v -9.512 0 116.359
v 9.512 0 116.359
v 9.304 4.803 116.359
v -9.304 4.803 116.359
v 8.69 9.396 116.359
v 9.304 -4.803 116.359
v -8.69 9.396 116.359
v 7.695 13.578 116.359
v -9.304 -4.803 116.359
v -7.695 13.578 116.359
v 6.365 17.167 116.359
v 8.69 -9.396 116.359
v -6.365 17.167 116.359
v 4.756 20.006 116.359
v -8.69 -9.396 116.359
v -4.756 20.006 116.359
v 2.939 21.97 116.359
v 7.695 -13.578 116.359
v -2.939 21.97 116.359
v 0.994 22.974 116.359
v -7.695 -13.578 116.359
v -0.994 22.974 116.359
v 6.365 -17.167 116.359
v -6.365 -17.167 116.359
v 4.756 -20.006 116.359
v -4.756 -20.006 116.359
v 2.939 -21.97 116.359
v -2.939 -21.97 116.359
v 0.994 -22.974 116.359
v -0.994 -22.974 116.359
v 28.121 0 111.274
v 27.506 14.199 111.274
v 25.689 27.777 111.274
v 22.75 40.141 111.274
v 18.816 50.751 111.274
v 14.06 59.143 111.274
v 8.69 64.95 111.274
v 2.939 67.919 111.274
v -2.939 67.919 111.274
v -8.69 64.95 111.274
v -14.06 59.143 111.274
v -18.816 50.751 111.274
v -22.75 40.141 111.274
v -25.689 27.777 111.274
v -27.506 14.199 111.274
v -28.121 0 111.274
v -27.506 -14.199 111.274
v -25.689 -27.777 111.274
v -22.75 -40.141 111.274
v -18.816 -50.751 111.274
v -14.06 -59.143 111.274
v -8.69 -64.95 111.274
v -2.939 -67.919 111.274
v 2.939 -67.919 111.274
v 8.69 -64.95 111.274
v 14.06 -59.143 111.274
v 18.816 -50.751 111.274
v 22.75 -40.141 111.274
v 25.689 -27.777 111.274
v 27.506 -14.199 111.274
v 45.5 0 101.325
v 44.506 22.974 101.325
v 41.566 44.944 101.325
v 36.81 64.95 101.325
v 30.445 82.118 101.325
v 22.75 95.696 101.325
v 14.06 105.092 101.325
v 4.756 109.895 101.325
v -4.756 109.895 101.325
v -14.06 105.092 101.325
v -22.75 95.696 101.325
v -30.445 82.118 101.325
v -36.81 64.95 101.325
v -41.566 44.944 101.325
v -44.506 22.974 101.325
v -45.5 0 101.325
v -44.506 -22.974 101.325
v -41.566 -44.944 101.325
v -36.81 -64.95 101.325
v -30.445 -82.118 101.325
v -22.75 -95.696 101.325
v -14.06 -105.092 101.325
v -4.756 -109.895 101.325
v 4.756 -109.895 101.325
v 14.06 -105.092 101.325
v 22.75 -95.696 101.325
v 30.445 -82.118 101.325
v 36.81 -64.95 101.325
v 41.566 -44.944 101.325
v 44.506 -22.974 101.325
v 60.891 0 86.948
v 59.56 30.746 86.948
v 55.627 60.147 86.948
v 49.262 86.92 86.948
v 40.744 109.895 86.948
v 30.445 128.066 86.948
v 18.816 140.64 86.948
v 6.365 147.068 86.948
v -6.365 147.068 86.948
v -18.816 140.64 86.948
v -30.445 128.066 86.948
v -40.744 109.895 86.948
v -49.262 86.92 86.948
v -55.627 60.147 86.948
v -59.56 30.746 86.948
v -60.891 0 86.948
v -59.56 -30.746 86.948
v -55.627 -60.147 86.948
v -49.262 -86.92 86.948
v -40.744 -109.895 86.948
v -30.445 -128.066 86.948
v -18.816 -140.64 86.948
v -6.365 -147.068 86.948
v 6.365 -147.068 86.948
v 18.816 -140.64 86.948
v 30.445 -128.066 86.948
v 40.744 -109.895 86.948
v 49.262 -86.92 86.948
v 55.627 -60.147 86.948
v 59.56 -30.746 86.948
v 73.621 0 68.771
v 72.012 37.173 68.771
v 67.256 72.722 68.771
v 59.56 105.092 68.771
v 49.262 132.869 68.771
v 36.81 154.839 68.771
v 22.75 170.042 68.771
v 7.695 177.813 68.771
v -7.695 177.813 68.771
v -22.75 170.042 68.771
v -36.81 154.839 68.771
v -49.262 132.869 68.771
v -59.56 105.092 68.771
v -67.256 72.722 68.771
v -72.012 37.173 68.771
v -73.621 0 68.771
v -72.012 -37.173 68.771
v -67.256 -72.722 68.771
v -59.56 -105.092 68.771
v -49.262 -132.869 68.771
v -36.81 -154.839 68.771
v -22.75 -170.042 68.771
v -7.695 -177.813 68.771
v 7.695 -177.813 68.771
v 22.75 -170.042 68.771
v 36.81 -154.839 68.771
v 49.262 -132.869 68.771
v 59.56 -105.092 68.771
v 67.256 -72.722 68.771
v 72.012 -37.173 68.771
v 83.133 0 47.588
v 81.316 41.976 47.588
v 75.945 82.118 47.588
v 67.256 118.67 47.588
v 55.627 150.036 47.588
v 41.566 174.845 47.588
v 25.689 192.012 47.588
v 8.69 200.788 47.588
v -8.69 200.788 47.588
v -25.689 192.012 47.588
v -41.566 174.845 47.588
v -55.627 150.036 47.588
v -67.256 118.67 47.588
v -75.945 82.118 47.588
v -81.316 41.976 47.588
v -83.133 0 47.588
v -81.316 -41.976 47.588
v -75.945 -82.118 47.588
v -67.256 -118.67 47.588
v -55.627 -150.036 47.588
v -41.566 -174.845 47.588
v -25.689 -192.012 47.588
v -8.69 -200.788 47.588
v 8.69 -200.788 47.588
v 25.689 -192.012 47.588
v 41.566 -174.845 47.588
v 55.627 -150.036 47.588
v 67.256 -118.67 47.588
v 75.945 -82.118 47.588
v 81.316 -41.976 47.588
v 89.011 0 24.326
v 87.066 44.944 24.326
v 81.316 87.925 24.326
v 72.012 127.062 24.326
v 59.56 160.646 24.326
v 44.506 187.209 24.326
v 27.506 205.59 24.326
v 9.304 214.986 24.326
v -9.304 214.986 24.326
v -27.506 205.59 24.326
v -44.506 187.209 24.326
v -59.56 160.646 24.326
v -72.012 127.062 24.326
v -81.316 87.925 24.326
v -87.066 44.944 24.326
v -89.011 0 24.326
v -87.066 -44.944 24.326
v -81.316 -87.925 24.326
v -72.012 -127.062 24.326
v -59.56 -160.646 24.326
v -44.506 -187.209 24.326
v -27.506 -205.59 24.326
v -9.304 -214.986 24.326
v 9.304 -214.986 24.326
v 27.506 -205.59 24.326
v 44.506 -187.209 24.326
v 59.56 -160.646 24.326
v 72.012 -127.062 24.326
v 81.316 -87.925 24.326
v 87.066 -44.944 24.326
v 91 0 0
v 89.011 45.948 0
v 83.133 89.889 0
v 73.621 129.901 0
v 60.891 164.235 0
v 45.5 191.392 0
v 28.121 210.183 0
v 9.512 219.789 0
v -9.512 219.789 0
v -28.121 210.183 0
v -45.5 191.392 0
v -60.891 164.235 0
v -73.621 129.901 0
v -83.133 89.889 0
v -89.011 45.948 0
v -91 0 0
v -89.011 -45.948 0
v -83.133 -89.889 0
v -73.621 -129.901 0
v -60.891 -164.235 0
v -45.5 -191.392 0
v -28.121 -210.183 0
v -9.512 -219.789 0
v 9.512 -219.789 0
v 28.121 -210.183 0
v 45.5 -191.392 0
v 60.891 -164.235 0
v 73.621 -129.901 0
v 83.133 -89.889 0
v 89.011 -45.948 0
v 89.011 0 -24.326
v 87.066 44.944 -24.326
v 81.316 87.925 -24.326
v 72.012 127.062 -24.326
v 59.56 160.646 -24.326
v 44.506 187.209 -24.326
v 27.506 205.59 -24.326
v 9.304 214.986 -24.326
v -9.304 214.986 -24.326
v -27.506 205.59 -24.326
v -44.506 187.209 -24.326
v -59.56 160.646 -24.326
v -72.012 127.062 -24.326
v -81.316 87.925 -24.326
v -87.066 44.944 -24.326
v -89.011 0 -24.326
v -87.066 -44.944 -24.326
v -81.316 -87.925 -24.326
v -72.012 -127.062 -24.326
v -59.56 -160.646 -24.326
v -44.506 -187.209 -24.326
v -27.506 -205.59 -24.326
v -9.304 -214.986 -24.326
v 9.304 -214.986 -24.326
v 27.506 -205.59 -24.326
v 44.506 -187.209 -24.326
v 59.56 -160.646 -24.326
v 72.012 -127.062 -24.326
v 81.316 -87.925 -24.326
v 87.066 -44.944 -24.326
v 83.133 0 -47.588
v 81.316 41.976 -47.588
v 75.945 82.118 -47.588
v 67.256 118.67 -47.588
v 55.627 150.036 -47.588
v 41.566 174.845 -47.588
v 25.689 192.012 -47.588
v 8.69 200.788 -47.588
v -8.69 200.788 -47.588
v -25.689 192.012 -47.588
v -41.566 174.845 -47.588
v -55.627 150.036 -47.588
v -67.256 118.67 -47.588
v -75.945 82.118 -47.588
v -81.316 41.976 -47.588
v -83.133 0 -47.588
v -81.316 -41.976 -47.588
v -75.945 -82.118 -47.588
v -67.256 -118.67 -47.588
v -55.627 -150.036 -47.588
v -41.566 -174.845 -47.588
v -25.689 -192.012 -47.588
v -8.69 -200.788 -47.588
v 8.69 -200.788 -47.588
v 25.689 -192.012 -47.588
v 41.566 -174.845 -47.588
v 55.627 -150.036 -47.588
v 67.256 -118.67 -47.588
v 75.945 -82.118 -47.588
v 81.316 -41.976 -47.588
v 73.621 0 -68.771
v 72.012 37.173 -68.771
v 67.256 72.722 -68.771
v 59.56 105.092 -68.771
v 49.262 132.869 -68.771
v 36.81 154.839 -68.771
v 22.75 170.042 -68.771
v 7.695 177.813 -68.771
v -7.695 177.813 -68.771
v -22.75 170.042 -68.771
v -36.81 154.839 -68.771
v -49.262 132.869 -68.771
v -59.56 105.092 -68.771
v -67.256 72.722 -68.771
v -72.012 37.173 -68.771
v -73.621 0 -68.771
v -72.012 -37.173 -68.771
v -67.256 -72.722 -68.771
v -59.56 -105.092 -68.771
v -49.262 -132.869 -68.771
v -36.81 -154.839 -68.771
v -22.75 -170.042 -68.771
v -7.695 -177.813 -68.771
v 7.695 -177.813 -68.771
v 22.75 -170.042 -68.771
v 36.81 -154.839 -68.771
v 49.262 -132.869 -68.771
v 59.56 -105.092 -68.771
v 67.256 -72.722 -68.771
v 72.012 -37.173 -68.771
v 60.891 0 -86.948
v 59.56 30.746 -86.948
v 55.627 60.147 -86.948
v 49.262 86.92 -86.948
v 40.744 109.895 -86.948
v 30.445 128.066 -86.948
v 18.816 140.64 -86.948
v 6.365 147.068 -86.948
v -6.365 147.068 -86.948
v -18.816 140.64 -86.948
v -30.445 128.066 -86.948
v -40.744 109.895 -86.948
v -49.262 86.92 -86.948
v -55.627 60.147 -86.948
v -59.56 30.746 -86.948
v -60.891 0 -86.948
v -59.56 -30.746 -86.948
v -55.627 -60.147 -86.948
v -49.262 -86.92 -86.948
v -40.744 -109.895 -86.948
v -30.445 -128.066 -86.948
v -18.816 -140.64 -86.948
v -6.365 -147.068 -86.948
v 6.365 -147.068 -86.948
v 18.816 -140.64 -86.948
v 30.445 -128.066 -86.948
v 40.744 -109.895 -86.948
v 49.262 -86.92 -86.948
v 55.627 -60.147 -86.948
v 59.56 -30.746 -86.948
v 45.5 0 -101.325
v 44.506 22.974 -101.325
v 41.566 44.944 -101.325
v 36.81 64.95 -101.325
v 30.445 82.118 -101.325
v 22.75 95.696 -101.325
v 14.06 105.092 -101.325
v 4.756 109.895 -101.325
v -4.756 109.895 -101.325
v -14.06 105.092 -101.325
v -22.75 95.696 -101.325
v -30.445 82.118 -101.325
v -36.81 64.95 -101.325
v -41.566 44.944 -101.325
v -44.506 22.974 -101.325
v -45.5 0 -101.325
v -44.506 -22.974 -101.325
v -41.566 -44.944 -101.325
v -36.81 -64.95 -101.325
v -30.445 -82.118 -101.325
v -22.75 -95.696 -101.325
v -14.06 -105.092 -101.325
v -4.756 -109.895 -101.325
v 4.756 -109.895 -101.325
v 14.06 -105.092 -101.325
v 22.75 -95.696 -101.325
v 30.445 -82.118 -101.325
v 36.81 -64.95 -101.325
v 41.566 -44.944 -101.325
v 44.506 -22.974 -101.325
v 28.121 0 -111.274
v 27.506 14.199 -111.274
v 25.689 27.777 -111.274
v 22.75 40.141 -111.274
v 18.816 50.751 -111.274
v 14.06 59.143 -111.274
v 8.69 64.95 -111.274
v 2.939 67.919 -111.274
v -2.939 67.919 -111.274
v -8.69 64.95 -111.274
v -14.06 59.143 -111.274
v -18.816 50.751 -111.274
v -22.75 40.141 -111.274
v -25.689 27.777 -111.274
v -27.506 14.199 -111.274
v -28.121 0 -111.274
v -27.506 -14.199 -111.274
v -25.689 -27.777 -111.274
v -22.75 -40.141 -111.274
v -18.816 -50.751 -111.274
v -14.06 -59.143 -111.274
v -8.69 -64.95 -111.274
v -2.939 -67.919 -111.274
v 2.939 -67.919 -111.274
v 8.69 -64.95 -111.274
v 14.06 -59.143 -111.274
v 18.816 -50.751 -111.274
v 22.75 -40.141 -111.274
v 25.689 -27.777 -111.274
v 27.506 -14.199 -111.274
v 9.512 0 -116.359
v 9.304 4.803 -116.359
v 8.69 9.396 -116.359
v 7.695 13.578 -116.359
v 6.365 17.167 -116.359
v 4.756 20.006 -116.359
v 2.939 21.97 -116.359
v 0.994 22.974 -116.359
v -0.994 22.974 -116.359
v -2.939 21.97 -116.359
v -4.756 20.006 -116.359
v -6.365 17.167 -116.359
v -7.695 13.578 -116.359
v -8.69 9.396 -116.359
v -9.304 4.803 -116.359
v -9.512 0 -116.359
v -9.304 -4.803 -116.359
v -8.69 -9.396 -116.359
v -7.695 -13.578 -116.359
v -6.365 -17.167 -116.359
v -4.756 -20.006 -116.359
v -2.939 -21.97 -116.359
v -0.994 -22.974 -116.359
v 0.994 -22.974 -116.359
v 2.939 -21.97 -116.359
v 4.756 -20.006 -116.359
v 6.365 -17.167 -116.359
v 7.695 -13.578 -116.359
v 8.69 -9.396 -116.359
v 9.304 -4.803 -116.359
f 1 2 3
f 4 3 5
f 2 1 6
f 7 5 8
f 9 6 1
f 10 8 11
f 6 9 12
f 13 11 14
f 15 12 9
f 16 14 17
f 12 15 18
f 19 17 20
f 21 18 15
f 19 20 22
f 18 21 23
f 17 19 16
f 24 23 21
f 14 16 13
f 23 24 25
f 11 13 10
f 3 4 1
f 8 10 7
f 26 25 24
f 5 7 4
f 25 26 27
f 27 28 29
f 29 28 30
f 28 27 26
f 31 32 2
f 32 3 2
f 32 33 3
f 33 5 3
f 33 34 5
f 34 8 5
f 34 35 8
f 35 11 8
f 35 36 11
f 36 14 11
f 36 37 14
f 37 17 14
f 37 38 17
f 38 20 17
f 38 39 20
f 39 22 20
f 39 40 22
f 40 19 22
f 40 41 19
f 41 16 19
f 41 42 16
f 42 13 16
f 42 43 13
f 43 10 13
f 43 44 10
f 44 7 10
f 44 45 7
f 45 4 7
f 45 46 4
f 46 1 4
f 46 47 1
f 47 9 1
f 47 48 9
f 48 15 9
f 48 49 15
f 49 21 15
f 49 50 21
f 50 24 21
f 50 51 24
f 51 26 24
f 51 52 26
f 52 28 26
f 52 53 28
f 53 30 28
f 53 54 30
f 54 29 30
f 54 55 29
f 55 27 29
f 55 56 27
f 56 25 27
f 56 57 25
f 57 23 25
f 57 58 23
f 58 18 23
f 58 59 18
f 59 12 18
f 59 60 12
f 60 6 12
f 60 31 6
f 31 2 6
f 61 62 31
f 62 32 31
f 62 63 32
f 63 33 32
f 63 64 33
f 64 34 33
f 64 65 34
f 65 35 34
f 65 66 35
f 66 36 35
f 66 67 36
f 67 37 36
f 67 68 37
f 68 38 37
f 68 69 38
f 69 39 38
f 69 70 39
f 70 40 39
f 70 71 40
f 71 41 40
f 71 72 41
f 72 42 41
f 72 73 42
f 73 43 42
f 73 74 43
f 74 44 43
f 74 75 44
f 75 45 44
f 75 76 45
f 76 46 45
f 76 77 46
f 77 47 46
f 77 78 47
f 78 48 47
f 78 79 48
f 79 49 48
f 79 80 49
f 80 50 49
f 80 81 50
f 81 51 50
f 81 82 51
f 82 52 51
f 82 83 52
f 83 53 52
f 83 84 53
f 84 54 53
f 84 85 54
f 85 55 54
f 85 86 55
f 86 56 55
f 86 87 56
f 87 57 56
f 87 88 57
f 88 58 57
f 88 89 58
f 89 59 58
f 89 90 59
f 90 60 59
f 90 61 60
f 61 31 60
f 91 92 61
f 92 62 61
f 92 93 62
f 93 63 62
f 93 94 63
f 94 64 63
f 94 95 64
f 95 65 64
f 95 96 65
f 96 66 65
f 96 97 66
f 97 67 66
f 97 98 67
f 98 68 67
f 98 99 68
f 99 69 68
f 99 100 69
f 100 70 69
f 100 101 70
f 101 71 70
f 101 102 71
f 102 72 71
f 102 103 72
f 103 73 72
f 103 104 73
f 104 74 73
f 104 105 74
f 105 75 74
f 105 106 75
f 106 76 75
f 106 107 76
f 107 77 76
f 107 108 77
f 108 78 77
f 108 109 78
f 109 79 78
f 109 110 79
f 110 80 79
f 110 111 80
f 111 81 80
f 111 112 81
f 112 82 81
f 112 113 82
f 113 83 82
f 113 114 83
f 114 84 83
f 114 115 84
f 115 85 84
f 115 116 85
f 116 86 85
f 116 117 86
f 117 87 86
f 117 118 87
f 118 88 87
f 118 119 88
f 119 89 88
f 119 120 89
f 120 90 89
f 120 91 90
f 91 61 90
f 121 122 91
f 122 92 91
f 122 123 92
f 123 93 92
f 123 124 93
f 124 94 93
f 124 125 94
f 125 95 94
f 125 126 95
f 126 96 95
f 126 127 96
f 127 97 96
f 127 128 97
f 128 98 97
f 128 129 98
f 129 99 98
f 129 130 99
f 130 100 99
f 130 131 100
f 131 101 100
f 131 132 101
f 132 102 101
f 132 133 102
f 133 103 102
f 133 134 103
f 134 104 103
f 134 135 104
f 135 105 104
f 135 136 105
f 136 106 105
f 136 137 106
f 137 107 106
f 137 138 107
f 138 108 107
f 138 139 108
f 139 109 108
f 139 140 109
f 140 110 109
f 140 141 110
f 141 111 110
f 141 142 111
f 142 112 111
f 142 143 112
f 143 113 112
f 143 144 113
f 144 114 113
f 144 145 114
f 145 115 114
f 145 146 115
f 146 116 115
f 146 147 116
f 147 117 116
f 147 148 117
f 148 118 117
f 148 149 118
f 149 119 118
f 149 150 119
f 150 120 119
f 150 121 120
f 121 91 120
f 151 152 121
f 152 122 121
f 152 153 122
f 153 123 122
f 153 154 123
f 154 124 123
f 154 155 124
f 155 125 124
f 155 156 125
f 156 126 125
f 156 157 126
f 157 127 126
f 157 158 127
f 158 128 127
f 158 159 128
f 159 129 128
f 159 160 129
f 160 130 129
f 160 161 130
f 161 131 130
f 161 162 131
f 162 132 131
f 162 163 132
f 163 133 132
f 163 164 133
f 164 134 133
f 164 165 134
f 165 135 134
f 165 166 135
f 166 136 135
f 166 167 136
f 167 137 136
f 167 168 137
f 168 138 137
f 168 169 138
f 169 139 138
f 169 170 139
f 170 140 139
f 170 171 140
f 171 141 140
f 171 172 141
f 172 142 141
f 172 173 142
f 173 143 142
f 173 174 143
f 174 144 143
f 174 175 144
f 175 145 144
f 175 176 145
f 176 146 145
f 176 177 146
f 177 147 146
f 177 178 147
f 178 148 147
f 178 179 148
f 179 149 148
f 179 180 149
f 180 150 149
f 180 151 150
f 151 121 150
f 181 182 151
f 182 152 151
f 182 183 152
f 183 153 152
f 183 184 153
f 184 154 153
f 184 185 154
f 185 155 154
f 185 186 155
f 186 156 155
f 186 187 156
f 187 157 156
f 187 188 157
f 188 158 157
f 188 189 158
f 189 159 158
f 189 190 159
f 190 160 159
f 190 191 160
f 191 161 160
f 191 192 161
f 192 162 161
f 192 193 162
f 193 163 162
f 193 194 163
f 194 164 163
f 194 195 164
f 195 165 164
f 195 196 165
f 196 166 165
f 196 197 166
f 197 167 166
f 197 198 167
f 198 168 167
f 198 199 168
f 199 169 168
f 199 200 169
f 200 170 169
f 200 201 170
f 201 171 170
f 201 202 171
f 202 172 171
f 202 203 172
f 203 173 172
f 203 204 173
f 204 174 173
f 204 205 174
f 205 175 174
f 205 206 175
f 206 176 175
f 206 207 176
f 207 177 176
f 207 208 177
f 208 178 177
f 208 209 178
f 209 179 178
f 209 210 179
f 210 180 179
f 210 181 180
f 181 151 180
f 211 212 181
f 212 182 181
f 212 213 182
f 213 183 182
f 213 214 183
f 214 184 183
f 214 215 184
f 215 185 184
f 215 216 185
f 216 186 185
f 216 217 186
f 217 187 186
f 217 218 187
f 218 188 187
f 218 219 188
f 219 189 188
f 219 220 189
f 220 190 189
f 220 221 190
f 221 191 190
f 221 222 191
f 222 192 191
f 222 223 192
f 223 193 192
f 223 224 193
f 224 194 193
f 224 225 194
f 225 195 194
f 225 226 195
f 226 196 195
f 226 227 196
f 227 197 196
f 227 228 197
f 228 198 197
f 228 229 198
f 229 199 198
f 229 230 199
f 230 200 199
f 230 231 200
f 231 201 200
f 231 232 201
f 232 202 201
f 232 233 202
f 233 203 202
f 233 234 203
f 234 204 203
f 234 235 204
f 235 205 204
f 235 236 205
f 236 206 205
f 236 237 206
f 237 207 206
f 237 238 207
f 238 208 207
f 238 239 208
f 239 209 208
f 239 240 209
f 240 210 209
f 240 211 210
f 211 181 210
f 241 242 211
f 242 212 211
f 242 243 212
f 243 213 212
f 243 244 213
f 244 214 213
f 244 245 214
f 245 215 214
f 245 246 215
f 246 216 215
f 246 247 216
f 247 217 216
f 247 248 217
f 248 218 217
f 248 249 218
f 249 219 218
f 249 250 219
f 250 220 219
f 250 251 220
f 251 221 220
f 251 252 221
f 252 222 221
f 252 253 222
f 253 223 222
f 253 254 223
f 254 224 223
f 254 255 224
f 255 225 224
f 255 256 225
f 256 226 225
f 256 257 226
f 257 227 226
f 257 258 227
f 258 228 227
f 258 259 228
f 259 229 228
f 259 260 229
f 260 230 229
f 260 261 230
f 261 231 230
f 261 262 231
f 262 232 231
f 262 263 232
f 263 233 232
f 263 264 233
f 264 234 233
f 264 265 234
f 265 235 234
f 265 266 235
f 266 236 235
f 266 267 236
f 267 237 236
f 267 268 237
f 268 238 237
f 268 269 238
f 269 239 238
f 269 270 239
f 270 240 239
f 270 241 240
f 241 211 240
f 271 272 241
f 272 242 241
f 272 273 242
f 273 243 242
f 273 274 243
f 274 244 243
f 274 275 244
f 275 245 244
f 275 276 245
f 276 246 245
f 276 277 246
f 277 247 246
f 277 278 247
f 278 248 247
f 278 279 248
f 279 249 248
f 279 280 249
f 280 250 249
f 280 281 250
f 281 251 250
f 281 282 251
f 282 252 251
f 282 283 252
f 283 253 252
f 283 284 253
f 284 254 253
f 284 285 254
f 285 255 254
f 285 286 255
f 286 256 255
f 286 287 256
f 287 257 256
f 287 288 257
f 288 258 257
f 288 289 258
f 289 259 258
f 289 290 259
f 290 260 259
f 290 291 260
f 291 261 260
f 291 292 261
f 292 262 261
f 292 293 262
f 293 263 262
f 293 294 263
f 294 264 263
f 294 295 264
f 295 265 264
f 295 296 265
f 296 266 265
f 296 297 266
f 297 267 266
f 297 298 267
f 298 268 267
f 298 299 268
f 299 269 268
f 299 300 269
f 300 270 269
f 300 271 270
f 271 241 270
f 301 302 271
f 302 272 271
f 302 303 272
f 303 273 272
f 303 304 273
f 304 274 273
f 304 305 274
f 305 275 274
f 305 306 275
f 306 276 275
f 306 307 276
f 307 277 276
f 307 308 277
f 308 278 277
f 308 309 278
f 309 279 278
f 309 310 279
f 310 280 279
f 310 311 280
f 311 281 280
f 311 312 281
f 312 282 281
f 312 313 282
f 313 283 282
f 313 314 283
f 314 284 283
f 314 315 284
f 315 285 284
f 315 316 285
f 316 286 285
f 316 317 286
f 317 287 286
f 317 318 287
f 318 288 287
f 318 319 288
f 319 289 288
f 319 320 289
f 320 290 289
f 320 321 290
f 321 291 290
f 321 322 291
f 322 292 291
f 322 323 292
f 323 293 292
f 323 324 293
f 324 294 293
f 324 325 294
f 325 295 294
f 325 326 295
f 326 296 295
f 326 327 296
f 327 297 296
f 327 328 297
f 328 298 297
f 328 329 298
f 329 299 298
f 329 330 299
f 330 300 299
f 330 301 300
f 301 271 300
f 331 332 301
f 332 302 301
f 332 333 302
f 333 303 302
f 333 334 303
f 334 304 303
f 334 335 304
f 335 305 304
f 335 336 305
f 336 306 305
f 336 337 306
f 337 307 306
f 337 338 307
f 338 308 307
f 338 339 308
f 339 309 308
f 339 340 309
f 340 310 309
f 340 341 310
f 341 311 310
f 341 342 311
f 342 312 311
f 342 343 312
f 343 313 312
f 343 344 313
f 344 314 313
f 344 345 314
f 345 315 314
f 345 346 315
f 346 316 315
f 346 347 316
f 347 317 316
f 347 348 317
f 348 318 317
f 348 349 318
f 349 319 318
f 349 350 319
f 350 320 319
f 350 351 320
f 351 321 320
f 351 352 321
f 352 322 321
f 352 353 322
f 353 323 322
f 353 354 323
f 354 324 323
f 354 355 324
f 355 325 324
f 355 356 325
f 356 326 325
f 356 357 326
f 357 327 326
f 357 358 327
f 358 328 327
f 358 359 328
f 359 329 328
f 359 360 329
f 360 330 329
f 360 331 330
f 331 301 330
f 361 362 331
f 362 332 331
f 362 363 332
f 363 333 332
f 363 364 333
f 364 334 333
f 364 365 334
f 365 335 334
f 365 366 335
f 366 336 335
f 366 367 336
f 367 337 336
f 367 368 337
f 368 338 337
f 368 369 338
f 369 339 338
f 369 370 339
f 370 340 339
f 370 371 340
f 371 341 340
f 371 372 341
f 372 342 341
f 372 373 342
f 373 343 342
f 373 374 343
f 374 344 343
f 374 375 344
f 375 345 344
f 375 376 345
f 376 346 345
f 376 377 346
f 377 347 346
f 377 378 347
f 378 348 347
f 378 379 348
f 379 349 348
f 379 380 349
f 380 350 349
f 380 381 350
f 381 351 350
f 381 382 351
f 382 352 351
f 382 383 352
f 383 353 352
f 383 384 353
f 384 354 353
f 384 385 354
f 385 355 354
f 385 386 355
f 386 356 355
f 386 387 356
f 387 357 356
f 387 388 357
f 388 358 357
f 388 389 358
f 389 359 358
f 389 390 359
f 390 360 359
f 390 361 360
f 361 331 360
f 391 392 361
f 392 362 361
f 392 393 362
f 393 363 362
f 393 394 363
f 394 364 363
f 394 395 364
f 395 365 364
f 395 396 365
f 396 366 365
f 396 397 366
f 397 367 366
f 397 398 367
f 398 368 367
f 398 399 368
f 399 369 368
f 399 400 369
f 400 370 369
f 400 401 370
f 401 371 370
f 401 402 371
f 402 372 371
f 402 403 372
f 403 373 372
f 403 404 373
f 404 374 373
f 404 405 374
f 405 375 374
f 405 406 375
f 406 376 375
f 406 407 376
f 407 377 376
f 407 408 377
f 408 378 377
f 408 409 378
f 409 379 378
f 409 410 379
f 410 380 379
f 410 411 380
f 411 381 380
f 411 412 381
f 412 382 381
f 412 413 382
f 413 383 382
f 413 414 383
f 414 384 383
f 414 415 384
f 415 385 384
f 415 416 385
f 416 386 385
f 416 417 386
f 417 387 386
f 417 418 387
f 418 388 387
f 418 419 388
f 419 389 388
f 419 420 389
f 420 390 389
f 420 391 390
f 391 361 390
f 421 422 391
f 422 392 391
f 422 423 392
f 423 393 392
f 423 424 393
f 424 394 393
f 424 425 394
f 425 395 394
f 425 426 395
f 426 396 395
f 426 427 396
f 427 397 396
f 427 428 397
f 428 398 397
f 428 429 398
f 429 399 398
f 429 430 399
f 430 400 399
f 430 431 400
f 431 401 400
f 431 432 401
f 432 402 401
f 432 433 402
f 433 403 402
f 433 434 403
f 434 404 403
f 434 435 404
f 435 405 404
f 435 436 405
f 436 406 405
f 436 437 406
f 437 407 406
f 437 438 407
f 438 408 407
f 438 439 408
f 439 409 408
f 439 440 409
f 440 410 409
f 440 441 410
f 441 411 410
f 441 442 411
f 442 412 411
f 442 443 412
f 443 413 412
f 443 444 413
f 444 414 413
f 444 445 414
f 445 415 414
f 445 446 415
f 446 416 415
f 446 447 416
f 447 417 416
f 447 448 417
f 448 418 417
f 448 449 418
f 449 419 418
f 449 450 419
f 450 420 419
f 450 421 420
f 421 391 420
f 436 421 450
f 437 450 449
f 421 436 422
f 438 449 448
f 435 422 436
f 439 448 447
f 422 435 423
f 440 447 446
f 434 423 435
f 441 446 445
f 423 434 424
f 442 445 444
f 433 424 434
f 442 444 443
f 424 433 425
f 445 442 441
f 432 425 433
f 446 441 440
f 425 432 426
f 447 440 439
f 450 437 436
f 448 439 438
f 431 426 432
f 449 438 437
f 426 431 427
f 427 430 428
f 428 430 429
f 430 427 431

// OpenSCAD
// Generated by SolidPython 1.0.1 on 2020-07-29 00:46:48


scale(v = [7, 17, 9]) {
	sphere(r = 13);
}
/***********************************************
*********      SolidPython code:      **********
************************************************
 
# import packages: SolidPython
from solid import *
from solid.utils import *
from itertools import chain, combinations, permutations


class Resize:

    def __init__(self, scad_file):
        self.scad_file = scad_file
        #self.scad_file = import_scad(scad_file)
        # cone/cylinder param:
        self.r1 = 0
        self.r2 = 0
        self.h = 0
        # rectangular prism param:
        self.w = 0
        self.l = 0
        # ellipse param:
        self.r = 0

    # import OpenScad code (file name corresponds to shape)


    # classify shape + parameters
    def assign(self, param1, param2, param3):
        if self.scad_file == 'cone.scad':
            self.r1 = param1
            self.r2 = param2
            self.h = param3
        elif self.scad_file == 'cylinder.scad':
            self.r1 = param1
            self.r2 = param2
            self.h = param3
        elif self.scad_file == 'rectangularPrism.scad':
            self.h = param1
            self.l = param2
            self.w = param3
        else:
            self.r = param1
            self.h = param2

    # resize parameters
    def iterate(self):
        x = range(3, 20, 2)
        i = 1
        if self.scad_file == 'cone.scad':
            tempList = list(permutations(x, 2))
            for temp in tempList:
                param1 = temp[0]
                param2 = temp[1]
                filepath = 'produced_scad_files/' + 'cone' + str(param1) + '_' + str(param2) + '_' + '.scad'
                scad_render_to_file(cylinder(h=param1, r1=param2, r2=0), filepath)

        elif self.scad_file == 'cylinder.scad':
            tempList = list(permutations(x, 3))
            for temp in tempList:
                param1 = temp[0]
                param2 = temp[1]
                filepath = 'produced_scad_files/' + 'cylinder' + str(param1) + '_' + str(param2) + '_' + '.scad'
                scad_render_to_file(cylinder(h=param1, r1=param2, r2=param2), filepath)

        elif self.scad_file == 'rectangularPrism.scad':
            tempList = list(permutations(x, 3))
            for temp in tempList:
                param1 = temp[0]
                param2 = temp[1]
                param3 = temp[2]
                filepath = 'produced_scad_files/' + 'rectangularPrism' + str(param1) + '_' + str(param2) + '_' + str(
                    param3) + '.scad'
                scad_render_to_file(cube(size=(param1, param2, param3)), filepath)

        elif self.scad_file == 'ellipse.scad':
            tempList = list(permutations(x, 4))
            for temp in tempList:
                param1 = temp[0]
                param2 = temp[1]
                param3 = temp[2]
                param4 = temp[3]
                filepath = 'produced_scad_files/' + 'ellipse' + str(param1) + '_' + str(param2) + '_' + str(param3) + '_' + str(param4) + '.scad'
                scad_render_to_file(scale([param1, param2, param3])(sphere(r=param4)), filepath)

    def render_to_scadfile(self):
        scad_render_to_file(scad, 'example.scad') 
 
************************************************/
